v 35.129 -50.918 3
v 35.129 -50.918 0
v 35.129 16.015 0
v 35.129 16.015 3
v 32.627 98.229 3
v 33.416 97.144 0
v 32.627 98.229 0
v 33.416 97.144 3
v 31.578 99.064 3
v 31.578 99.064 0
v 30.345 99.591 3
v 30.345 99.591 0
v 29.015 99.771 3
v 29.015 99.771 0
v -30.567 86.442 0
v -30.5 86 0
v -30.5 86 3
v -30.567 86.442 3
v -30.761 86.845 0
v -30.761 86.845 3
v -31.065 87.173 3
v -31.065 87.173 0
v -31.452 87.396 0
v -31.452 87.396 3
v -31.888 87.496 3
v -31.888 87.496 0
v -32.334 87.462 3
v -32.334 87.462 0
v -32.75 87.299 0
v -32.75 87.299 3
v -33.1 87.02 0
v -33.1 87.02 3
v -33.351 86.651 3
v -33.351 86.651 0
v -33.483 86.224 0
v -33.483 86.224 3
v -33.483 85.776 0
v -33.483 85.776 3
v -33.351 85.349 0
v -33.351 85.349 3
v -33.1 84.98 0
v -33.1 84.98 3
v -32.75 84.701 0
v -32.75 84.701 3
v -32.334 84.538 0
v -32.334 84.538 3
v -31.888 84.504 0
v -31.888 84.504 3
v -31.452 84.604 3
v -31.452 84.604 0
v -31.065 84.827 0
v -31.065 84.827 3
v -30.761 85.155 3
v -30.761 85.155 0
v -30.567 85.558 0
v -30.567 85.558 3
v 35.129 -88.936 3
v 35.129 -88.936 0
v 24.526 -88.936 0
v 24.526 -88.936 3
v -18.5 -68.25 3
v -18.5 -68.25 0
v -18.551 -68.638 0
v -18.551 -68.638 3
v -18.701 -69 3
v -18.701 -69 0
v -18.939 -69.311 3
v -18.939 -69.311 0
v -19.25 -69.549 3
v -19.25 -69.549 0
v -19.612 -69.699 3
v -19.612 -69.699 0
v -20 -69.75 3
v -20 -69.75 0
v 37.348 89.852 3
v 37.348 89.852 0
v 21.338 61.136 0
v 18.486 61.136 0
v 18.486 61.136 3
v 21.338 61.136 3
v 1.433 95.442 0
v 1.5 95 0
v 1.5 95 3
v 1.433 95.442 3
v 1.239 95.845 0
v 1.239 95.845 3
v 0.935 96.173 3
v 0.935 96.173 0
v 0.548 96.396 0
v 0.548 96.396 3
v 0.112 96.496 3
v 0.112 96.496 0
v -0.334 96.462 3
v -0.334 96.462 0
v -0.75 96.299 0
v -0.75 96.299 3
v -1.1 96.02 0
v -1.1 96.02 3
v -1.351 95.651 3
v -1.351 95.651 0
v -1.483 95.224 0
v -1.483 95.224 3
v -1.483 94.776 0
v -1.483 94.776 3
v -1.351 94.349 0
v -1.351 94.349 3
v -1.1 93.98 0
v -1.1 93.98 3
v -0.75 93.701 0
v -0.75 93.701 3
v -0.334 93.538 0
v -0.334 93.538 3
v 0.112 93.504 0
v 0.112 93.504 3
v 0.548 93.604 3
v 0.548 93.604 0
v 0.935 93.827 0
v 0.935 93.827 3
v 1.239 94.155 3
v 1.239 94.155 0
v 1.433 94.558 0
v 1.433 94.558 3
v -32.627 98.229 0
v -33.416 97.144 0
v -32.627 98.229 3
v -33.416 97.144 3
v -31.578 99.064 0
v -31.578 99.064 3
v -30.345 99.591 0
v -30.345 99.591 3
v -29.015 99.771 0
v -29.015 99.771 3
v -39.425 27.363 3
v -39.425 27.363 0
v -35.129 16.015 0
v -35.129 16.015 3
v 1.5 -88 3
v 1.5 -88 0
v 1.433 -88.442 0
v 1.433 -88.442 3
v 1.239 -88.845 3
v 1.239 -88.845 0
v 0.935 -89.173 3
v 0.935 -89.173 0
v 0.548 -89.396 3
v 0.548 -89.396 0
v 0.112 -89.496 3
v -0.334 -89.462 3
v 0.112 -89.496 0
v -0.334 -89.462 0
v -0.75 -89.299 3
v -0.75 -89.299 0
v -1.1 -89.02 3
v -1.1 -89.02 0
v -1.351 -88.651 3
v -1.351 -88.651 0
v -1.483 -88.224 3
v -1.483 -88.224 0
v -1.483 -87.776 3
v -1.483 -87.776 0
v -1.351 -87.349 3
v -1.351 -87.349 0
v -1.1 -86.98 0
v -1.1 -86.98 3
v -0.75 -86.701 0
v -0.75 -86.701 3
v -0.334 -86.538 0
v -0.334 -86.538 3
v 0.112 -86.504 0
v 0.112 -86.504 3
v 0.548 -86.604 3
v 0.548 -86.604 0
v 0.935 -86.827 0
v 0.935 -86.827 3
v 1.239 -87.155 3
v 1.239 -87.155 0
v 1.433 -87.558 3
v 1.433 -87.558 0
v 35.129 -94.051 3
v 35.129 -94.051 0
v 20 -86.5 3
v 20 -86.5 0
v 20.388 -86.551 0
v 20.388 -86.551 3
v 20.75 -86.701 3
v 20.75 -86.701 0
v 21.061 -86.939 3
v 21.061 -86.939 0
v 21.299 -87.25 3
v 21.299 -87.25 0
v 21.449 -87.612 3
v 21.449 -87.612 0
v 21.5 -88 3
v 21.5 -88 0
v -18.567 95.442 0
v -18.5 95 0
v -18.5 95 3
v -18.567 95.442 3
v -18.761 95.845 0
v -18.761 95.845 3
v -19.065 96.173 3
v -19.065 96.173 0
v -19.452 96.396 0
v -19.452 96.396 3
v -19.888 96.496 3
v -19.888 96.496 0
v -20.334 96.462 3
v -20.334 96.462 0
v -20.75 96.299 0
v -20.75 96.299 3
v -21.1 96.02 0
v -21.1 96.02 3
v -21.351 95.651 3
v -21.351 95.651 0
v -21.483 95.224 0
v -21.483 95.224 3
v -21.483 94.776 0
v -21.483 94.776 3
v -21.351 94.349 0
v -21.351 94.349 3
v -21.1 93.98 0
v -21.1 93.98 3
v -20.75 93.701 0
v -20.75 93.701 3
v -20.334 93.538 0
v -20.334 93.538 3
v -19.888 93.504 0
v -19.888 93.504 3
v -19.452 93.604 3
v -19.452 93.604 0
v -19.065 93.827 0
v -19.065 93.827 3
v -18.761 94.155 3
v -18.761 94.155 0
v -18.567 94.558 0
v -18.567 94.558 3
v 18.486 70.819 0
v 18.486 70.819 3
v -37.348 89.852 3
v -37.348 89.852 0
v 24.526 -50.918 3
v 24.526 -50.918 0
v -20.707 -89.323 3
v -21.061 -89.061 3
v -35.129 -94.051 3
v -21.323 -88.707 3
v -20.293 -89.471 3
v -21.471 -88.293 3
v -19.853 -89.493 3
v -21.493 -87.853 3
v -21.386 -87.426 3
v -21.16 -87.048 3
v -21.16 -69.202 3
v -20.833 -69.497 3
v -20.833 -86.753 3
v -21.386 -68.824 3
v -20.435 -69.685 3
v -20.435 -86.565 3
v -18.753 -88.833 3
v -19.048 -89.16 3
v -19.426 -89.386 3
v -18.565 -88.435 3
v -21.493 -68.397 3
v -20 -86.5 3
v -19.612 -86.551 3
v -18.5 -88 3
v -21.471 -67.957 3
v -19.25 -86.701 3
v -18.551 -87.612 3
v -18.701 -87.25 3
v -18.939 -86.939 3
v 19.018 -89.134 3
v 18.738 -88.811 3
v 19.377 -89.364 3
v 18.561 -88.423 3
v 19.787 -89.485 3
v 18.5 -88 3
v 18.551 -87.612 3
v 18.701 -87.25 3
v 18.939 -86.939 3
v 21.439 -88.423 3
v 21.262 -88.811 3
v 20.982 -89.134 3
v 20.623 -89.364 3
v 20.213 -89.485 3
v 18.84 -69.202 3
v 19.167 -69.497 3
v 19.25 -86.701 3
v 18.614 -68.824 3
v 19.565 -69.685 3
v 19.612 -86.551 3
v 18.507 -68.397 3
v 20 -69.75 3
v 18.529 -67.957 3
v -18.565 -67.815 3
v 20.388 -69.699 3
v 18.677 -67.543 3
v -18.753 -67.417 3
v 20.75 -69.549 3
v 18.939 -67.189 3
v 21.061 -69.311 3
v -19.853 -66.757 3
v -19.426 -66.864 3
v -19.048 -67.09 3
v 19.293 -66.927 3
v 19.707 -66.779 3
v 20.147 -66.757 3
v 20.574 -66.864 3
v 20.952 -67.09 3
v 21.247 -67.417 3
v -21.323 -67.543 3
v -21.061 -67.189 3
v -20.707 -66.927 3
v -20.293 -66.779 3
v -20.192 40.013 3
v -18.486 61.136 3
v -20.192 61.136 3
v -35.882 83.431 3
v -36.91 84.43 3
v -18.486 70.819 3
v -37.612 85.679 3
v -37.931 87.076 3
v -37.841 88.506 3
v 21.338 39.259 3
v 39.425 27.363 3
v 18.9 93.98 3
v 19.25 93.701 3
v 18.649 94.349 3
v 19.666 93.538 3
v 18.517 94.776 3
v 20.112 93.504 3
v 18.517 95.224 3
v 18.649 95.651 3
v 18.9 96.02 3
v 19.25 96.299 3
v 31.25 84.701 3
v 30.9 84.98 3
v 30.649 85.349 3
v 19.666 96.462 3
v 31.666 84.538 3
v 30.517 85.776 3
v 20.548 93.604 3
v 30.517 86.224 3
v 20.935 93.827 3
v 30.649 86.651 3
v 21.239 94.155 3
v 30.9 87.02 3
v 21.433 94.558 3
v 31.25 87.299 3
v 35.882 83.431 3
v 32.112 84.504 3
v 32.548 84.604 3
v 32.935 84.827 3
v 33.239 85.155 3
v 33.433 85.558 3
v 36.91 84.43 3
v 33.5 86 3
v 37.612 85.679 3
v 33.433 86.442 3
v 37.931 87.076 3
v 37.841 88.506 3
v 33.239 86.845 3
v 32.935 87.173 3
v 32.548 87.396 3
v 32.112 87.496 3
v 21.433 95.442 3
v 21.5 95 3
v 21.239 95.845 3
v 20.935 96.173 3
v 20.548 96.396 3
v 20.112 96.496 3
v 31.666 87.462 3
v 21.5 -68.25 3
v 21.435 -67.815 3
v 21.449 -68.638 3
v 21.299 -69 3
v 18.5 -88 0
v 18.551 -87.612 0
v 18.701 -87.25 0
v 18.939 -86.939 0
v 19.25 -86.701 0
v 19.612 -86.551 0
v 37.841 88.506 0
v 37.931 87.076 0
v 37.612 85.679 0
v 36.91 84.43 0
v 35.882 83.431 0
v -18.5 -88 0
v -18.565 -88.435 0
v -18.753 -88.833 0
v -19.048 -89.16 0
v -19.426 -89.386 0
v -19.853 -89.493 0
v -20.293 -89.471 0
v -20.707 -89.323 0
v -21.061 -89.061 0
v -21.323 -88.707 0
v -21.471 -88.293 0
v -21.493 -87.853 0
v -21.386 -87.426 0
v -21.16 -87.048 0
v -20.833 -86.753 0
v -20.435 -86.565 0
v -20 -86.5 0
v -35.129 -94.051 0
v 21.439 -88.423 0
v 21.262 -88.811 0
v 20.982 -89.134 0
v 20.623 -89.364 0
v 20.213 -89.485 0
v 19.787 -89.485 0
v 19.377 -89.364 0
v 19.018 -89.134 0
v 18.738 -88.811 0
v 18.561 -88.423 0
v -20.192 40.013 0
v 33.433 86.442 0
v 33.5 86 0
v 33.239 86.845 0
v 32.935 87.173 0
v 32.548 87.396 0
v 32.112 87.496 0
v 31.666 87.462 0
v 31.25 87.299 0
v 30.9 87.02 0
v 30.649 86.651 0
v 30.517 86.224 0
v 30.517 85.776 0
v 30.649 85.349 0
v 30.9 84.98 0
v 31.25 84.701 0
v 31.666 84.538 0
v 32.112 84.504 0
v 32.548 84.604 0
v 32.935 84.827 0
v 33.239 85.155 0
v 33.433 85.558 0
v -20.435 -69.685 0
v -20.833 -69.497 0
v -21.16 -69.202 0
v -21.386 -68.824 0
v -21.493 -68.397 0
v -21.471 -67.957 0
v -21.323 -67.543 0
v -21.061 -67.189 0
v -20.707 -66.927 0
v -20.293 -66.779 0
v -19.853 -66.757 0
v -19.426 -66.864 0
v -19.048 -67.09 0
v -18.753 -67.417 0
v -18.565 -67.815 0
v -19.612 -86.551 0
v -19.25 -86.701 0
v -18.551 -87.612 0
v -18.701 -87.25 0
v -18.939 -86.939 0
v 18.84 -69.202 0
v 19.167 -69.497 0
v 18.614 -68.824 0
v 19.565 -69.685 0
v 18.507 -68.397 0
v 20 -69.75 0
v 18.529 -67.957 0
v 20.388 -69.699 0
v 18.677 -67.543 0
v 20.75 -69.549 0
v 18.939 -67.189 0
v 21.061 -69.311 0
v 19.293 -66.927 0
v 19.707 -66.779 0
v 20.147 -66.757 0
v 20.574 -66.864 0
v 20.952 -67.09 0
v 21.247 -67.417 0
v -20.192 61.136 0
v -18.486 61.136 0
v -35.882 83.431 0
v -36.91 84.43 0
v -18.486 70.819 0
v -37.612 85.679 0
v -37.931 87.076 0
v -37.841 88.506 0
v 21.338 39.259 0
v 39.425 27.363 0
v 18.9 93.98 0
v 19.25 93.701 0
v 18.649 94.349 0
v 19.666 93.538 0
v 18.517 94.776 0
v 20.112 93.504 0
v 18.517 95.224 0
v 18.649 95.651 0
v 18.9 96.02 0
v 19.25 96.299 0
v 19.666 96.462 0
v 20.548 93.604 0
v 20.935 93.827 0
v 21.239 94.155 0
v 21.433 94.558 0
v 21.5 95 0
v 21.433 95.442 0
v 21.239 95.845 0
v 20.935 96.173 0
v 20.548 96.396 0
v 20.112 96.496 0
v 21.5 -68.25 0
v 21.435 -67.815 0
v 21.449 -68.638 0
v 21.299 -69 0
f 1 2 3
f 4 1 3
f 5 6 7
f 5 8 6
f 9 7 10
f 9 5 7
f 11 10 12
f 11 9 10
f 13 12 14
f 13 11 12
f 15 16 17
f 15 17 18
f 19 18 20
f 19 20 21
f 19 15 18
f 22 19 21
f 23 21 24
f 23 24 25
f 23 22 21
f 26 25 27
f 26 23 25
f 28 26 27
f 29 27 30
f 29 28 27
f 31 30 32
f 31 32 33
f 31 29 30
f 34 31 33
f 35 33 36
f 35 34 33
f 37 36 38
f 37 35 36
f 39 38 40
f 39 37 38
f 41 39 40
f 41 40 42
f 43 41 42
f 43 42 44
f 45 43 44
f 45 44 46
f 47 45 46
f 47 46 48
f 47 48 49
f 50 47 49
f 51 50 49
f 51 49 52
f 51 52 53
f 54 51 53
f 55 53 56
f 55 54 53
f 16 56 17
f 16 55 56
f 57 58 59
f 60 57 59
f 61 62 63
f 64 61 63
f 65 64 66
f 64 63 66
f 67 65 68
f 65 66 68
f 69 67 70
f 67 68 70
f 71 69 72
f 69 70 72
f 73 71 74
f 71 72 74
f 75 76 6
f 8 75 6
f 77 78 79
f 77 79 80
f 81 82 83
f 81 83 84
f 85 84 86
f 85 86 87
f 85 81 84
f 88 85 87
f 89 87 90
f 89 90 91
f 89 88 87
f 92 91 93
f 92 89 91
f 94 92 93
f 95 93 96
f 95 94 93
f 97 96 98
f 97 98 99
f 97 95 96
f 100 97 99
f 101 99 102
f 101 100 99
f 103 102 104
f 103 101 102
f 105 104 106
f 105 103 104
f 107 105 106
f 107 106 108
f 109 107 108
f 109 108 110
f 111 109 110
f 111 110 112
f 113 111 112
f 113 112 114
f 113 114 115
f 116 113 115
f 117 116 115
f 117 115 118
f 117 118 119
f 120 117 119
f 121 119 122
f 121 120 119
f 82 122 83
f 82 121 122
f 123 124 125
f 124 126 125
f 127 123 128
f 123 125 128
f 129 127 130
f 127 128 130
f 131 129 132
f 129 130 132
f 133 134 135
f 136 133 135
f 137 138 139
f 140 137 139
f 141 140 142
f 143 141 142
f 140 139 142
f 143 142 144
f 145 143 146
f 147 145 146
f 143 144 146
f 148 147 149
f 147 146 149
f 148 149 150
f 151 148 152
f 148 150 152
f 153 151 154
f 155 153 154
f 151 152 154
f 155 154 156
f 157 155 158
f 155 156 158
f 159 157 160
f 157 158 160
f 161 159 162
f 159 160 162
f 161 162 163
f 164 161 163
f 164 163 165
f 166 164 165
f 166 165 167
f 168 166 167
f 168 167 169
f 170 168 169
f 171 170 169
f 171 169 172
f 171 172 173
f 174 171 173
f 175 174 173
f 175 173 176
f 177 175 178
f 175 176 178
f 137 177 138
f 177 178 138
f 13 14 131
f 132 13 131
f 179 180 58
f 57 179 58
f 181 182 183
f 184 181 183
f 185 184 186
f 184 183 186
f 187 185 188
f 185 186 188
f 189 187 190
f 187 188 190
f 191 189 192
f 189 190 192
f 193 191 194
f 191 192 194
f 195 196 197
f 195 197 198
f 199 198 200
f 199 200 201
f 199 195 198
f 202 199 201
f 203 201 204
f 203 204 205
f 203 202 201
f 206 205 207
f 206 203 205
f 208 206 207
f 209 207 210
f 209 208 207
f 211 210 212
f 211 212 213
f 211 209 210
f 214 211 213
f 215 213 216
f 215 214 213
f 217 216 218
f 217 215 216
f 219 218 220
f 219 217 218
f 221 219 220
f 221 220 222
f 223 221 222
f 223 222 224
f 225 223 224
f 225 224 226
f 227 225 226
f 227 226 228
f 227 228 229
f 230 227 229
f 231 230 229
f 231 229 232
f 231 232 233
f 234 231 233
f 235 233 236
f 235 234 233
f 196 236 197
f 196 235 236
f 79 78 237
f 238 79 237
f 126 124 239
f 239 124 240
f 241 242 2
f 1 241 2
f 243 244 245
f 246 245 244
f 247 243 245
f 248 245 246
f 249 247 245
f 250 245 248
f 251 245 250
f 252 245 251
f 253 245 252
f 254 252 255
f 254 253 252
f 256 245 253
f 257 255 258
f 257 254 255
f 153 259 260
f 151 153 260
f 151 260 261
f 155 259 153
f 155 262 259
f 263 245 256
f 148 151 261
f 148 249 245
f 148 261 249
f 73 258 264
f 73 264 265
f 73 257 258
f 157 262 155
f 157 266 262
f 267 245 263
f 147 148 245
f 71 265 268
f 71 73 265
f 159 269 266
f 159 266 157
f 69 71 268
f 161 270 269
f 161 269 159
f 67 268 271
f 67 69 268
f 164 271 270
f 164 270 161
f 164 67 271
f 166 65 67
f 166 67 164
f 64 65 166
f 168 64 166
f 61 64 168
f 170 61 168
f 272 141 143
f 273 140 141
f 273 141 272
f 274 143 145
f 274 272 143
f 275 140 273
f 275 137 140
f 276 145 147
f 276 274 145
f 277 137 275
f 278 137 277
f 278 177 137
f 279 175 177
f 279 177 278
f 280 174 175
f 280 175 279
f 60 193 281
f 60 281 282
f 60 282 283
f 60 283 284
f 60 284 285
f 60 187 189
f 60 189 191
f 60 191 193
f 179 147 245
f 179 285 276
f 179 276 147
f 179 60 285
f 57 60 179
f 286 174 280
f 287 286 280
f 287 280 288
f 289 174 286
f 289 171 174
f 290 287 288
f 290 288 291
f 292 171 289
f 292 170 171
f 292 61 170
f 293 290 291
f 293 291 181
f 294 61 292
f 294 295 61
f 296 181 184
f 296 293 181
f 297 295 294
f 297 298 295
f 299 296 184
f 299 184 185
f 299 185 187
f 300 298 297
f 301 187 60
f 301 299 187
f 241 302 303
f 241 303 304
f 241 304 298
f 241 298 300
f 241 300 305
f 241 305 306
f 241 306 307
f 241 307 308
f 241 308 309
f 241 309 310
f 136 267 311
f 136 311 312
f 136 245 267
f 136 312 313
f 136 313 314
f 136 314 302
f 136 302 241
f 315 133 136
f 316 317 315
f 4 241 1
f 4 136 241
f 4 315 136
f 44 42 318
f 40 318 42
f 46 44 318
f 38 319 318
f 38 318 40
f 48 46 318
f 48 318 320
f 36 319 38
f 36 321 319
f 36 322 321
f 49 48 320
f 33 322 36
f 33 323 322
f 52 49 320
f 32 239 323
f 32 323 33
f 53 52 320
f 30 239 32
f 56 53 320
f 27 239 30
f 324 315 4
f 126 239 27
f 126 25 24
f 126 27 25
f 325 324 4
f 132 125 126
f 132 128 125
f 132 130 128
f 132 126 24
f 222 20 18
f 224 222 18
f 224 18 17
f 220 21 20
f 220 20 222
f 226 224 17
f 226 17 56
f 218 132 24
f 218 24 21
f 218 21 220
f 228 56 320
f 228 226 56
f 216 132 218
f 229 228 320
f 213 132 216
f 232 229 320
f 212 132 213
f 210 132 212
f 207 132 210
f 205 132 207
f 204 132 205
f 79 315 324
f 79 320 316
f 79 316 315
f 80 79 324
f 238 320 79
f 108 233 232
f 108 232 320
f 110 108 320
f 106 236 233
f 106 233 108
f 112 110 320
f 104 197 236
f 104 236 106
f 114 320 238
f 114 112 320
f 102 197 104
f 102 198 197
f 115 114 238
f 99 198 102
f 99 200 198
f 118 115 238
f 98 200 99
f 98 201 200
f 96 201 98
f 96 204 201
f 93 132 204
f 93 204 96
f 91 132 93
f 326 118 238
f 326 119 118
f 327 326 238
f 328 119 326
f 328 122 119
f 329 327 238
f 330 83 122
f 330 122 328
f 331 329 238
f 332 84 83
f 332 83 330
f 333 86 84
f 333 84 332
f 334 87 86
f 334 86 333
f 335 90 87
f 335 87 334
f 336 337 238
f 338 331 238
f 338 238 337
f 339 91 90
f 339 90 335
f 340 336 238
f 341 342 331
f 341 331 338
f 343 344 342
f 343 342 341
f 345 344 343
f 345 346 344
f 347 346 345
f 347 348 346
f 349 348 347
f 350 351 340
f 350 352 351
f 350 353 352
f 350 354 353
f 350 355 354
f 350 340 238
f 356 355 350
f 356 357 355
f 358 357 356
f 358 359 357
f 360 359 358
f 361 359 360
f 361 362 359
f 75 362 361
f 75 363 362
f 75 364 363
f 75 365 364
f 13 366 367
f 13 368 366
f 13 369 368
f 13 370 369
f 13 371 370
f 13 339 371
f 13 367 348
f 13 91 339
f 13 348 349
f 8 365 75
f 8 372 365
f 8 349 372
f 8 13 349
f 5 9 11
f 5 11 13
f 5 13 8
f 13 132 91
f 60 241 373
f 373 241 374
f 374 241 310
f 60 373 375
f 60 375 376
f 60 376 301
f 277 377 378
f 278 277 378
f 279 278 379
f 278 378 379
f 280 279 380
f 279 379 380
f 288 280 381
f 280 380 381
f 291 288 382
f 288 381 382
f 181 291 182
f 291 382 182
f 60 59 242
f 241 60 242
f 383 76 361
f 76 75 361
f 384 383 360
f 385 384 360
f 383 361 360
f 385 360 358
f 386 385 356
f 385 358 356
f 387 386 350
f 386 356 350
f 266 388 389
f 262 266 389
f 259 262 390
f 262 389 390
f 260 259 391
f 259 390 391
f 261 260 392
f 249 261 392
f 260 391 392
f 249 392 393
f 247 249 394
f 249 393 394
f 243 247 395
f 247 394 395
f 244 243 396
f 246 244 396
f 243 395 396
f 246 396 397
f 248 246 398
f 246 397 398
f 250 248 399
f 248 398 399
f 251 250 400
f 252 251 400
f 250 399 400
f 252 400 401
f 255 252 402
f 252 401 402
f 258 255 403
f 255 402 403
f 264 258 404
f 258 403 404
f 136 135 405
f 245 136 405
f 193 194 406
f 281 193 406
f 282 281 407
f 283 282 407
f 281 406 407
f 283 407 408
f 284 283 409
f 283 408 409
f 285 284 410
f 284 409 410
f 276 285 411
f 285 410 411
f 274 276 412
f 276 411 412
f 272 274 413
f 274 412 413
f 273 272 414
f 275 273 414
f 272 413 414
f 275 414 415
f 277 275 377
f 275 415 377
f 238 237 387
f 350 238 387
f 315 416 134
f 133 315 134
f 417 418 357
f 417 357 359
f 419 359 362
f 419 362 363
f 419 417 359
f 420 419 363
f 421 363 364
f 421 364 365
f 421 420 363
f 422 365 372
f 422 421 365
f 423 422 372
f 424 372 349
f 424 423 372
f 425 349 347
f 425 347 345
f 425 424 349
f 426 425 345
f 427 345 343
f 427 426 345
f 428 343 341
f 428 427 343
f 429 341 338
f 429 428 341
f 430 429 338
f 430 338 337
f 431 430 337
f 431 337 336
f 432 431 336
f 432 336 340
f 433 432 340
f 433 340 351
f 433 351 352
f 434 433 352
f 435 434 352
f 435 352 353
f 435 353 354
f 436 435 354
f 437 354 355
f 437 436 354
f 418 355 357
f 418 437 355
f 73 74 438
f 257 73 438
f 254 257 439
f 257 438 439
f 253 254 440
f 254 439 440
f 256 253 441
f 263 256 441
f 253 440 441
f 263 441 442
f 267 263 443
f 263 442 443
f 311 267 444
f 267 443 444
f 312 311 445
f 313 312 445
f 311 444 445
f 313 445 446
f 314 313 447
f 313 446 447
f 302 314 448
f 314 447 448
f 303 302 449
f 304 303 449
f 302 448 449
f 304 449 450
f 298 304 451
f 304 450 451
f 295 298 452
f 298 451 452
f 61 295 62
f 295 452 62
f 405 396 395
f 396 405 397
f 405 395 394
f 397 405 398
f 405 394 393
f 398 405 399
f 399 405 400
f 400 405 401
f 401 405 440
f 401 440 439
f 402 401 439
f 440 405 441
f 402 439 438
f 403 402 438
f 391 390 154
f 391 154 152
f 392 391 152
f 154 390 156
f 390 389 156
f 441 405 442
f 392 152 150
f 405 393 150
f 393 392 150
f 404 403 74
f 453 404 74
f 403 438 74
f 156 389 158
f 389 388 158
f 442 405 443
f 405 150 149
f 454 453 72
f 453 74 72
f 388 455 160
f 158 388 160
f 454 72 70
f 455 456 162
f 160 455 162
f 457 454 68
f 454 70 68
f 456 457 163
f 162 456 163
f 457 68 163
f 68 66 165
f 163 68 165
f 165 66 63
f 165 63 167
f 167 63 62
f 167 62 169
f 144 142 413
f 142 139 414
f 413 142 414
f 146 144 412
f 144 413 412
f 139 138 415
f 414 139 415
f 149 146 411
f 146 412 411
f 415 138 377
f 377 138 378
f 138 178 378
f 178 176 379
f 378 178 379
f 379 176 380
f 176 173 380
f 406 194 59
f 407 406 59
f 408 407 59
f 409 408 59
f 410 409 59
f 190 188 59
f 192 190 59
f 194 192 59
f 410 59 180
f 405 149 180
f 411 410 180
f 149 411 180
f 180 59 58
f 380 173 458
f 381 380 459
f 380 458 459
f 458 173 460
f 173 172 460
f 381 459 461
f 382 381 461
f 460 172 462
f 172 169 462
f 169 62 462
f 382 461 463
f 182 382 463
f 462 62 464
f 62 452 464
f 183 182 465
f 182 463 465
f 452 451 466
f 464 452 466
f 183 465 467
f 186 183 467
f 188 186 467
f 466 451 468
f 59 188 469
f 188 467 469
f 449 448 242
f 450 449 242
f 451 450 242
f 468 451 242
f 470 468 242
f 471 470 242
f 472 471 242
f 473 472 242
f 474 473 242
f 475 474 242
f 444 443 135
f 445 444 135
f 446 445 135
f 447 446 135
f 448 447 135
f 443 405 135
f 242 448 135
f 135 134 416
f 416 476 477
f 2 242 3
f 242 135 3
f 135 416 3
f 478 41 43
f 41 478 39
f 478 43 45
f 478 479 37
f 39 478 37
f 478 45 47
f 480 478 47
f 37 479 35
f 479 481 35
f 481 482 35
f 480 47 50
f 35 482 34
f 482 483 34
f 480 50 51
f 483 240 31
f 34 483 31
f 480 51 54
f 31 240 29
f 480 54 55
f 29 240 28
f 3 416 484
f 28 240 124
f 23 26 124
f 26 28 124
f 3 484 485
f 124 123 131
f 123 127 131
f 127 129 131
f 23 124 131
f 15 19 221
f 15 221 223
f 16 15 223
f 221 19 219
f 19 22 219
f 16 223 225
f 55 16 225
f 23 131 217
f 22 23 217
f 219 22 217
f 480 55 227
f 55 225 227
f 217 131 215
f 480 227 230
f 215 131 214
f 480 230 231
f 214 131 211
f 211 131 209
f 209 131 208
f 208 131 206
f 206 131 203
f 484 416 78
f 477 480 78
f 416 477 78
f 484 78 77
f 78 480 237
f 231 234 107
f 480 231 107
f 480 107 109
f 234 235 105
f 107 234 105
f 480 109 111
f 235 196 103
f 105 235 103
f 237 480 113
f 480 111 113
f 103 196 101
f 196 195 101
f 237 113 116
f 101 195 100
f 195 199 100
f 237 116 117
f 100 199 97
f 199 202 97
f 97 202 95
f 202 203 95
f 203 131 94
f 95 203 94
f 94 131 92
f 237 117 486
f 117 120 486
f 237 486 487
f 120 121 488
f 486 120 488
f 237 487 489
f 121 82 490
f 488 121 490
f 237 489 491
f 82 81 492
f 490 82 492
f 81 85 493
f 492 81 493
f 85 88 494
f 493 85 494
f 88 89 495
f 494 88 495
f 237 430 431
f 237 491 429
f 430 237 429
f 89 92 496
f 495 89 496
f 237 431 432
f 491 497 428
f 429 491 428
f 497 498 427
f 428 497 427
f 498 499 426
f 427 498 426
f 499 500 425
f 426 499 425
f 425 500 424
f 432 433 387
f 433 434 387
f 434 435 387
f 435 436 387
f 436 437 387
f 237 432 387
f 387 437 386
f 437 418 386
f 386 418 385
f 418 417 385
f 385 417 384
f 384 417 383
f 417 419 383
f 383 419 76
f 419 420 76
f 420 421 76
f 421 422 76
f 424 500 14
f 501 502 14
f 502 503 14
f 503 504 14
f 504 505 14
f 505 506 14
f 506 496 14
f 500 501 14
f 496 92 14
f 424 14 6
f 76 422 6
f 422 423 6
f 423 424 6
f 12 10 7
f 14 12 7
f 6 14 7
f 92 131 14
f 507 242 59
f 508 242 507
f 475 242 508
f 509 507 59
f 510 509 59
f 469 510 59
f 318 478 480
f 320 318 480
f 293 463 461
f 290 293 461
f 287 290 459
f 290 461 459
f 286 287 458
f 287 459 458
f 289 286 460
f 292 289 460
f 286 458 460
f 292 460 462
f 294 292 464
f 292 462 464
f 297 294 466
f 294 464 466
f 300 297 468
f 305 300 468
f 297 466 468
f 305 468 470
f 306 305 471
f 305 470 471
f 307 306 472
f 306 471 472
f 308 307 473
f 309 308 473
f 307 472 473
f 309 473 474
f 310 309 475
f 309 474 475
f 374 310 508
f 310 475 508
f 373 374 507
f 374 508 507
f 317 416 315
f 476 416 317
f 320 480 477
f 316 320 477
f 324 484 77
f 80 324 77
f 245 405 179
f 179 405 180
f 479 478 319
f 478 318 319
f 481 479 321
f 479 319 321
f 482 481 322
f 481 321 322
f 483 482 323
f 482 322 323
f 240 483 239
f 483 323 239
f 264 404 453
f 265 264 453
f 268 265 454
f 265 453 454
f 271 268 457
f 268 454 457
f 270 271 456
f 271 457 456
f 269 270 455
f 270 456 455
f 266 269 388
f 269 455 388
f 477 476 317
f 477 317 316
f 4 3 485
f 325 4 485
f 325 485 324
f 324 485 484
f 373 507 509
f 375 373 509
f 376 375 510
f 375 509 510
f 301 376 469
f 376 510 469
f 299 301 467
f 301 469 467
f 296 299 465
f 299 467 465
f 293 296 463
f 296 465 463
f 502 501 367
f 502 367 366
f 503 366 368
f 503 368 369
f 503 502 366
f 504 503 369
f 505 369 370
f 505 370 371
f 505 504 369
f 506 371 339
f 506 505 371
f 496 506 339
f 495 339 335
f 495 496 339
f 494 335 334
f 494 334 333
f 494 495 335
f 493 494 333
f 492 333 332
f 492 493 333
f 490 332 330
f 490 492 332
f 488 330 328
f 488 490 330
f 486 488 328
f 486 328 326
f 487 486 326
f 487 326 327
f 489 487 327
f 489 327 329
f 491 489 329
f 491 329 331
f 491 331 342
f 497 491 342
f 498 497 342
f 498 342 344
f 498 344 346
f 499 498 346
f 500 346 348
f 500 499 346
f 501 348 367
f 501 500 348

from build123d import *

# Parameters (mm, degrees)
F0_R     = 1.5
F1_DEPTH = 3
F2_W     = 41.530054
F2_H     = 123.730924
F3_DEPTH = 3
F4_R     = 5


with BuildPart() as f1:
    # F0 (on Top) → F1 (new body)
    with BuildSketch(Plane.XY):
        Polygon((32, 99.771135), (-32, 99.771135), (-39.425235, 86), (-18.486274, 70.8194), (-18.486274, 41.134663), (-39.425235, 27.363142), (-35.128705, 16.014801), (-35.128705, -94.051212), (35.128705, -94.051212), (35.128705, -88.935837), (24.525635, -88.935837), (24.525635, -50.918393), (35.128705, -50.918393), (35.128705, 16.014801), (39.425235, 27.363142), (18.486274, 41.134663), (18.486274, 70.8194), (39.425235, 86), align=None)
        with BuildLine():
            ThreePointArc((-20, -86.5), (-18.93934, -86.93934), (-18.5, -88))
            ThreePointArc((-18.5, -88), (-21.06066, -89.06066), (-20, -86.5))
        make_face(mode=Mode.SUBTRACT)
        with BuildLine():
            ThreePointArc((-18.5, -68.25), (-18.93934, -69.31066), (-20, -69.75))
            ThreePointArc((-20, -69.75), (-21.06066, -67.18934), (-18.5, -68.25))
        make_face(mode=Mode.SUBTRACT)
        with BuildLine():
            ThreePointArc((-1.5, -88), (0, -86.5), (1.5, -88))
            ThreePointArc((1.5, -88), (0, -89.5), (-1.5, -88))
        make_face(mode=Mode.SUBTRACT)
        with BuildLine():
            ThreePointArc((21.5, -88), (20, -89.5), (18.5, -88))
            ThreePointArc((18.5, -88), (18.93934, -86.93934), (20, -86.5))
            ThreePointArc((20, -86.5), (21.06066, -86.93934), (21.5, -88))
        make_face(mode=Mode.SUBTRACT)
        with BuildLine():
            ThreePointArc((21.5, -68.25), (21.06066, -69.31066), (20, -69.75))
            ThreePointArc((20, -69.75), (18.93934, -67.18934), (21.5, -68.25))
        make_face(mode=Mode.SUBTRACT)
        with Locations((-32, 86)):
            Circle(F0_R, mode=Mode.SUBTRACT)
        with Locations((-20, 95)):
            Circle(F0_R, mode=Mode.SUBTRACT)
        with Locations((0, 95)):
            Circle(F0_R, mode=Mode.SUBTRACT)
        with Locations((20, 95)):
            Circle(F0_R, mode=Mode.SUBTRACT)
        with Locations((32, 86)):
            Circle(F0_R, mode=Mode.SUBTRACT)
    extrude(amount=F1_DEPTH)

    # F2 (on Top) → F3 (join)
    with BuildSketch(Plane.XY):
        with Locations((0.572829, -0.729354)):
            Rectangle(F2_W, F2_H)
    extrude(amount=F3_DEPTH)

    # F4
    f4_edges = [f1.edges().sort_by_distance(p)[0] for p in [
        (39.425235, 86, 1.5),
        (32, 99.771135, 1.5),
        (-32, 99.771135, 1.5),
        (-39.425235, 86, 1.5),
    ]]
    fillet(f4_edges, radius=F4_R)


solid = f1.part
